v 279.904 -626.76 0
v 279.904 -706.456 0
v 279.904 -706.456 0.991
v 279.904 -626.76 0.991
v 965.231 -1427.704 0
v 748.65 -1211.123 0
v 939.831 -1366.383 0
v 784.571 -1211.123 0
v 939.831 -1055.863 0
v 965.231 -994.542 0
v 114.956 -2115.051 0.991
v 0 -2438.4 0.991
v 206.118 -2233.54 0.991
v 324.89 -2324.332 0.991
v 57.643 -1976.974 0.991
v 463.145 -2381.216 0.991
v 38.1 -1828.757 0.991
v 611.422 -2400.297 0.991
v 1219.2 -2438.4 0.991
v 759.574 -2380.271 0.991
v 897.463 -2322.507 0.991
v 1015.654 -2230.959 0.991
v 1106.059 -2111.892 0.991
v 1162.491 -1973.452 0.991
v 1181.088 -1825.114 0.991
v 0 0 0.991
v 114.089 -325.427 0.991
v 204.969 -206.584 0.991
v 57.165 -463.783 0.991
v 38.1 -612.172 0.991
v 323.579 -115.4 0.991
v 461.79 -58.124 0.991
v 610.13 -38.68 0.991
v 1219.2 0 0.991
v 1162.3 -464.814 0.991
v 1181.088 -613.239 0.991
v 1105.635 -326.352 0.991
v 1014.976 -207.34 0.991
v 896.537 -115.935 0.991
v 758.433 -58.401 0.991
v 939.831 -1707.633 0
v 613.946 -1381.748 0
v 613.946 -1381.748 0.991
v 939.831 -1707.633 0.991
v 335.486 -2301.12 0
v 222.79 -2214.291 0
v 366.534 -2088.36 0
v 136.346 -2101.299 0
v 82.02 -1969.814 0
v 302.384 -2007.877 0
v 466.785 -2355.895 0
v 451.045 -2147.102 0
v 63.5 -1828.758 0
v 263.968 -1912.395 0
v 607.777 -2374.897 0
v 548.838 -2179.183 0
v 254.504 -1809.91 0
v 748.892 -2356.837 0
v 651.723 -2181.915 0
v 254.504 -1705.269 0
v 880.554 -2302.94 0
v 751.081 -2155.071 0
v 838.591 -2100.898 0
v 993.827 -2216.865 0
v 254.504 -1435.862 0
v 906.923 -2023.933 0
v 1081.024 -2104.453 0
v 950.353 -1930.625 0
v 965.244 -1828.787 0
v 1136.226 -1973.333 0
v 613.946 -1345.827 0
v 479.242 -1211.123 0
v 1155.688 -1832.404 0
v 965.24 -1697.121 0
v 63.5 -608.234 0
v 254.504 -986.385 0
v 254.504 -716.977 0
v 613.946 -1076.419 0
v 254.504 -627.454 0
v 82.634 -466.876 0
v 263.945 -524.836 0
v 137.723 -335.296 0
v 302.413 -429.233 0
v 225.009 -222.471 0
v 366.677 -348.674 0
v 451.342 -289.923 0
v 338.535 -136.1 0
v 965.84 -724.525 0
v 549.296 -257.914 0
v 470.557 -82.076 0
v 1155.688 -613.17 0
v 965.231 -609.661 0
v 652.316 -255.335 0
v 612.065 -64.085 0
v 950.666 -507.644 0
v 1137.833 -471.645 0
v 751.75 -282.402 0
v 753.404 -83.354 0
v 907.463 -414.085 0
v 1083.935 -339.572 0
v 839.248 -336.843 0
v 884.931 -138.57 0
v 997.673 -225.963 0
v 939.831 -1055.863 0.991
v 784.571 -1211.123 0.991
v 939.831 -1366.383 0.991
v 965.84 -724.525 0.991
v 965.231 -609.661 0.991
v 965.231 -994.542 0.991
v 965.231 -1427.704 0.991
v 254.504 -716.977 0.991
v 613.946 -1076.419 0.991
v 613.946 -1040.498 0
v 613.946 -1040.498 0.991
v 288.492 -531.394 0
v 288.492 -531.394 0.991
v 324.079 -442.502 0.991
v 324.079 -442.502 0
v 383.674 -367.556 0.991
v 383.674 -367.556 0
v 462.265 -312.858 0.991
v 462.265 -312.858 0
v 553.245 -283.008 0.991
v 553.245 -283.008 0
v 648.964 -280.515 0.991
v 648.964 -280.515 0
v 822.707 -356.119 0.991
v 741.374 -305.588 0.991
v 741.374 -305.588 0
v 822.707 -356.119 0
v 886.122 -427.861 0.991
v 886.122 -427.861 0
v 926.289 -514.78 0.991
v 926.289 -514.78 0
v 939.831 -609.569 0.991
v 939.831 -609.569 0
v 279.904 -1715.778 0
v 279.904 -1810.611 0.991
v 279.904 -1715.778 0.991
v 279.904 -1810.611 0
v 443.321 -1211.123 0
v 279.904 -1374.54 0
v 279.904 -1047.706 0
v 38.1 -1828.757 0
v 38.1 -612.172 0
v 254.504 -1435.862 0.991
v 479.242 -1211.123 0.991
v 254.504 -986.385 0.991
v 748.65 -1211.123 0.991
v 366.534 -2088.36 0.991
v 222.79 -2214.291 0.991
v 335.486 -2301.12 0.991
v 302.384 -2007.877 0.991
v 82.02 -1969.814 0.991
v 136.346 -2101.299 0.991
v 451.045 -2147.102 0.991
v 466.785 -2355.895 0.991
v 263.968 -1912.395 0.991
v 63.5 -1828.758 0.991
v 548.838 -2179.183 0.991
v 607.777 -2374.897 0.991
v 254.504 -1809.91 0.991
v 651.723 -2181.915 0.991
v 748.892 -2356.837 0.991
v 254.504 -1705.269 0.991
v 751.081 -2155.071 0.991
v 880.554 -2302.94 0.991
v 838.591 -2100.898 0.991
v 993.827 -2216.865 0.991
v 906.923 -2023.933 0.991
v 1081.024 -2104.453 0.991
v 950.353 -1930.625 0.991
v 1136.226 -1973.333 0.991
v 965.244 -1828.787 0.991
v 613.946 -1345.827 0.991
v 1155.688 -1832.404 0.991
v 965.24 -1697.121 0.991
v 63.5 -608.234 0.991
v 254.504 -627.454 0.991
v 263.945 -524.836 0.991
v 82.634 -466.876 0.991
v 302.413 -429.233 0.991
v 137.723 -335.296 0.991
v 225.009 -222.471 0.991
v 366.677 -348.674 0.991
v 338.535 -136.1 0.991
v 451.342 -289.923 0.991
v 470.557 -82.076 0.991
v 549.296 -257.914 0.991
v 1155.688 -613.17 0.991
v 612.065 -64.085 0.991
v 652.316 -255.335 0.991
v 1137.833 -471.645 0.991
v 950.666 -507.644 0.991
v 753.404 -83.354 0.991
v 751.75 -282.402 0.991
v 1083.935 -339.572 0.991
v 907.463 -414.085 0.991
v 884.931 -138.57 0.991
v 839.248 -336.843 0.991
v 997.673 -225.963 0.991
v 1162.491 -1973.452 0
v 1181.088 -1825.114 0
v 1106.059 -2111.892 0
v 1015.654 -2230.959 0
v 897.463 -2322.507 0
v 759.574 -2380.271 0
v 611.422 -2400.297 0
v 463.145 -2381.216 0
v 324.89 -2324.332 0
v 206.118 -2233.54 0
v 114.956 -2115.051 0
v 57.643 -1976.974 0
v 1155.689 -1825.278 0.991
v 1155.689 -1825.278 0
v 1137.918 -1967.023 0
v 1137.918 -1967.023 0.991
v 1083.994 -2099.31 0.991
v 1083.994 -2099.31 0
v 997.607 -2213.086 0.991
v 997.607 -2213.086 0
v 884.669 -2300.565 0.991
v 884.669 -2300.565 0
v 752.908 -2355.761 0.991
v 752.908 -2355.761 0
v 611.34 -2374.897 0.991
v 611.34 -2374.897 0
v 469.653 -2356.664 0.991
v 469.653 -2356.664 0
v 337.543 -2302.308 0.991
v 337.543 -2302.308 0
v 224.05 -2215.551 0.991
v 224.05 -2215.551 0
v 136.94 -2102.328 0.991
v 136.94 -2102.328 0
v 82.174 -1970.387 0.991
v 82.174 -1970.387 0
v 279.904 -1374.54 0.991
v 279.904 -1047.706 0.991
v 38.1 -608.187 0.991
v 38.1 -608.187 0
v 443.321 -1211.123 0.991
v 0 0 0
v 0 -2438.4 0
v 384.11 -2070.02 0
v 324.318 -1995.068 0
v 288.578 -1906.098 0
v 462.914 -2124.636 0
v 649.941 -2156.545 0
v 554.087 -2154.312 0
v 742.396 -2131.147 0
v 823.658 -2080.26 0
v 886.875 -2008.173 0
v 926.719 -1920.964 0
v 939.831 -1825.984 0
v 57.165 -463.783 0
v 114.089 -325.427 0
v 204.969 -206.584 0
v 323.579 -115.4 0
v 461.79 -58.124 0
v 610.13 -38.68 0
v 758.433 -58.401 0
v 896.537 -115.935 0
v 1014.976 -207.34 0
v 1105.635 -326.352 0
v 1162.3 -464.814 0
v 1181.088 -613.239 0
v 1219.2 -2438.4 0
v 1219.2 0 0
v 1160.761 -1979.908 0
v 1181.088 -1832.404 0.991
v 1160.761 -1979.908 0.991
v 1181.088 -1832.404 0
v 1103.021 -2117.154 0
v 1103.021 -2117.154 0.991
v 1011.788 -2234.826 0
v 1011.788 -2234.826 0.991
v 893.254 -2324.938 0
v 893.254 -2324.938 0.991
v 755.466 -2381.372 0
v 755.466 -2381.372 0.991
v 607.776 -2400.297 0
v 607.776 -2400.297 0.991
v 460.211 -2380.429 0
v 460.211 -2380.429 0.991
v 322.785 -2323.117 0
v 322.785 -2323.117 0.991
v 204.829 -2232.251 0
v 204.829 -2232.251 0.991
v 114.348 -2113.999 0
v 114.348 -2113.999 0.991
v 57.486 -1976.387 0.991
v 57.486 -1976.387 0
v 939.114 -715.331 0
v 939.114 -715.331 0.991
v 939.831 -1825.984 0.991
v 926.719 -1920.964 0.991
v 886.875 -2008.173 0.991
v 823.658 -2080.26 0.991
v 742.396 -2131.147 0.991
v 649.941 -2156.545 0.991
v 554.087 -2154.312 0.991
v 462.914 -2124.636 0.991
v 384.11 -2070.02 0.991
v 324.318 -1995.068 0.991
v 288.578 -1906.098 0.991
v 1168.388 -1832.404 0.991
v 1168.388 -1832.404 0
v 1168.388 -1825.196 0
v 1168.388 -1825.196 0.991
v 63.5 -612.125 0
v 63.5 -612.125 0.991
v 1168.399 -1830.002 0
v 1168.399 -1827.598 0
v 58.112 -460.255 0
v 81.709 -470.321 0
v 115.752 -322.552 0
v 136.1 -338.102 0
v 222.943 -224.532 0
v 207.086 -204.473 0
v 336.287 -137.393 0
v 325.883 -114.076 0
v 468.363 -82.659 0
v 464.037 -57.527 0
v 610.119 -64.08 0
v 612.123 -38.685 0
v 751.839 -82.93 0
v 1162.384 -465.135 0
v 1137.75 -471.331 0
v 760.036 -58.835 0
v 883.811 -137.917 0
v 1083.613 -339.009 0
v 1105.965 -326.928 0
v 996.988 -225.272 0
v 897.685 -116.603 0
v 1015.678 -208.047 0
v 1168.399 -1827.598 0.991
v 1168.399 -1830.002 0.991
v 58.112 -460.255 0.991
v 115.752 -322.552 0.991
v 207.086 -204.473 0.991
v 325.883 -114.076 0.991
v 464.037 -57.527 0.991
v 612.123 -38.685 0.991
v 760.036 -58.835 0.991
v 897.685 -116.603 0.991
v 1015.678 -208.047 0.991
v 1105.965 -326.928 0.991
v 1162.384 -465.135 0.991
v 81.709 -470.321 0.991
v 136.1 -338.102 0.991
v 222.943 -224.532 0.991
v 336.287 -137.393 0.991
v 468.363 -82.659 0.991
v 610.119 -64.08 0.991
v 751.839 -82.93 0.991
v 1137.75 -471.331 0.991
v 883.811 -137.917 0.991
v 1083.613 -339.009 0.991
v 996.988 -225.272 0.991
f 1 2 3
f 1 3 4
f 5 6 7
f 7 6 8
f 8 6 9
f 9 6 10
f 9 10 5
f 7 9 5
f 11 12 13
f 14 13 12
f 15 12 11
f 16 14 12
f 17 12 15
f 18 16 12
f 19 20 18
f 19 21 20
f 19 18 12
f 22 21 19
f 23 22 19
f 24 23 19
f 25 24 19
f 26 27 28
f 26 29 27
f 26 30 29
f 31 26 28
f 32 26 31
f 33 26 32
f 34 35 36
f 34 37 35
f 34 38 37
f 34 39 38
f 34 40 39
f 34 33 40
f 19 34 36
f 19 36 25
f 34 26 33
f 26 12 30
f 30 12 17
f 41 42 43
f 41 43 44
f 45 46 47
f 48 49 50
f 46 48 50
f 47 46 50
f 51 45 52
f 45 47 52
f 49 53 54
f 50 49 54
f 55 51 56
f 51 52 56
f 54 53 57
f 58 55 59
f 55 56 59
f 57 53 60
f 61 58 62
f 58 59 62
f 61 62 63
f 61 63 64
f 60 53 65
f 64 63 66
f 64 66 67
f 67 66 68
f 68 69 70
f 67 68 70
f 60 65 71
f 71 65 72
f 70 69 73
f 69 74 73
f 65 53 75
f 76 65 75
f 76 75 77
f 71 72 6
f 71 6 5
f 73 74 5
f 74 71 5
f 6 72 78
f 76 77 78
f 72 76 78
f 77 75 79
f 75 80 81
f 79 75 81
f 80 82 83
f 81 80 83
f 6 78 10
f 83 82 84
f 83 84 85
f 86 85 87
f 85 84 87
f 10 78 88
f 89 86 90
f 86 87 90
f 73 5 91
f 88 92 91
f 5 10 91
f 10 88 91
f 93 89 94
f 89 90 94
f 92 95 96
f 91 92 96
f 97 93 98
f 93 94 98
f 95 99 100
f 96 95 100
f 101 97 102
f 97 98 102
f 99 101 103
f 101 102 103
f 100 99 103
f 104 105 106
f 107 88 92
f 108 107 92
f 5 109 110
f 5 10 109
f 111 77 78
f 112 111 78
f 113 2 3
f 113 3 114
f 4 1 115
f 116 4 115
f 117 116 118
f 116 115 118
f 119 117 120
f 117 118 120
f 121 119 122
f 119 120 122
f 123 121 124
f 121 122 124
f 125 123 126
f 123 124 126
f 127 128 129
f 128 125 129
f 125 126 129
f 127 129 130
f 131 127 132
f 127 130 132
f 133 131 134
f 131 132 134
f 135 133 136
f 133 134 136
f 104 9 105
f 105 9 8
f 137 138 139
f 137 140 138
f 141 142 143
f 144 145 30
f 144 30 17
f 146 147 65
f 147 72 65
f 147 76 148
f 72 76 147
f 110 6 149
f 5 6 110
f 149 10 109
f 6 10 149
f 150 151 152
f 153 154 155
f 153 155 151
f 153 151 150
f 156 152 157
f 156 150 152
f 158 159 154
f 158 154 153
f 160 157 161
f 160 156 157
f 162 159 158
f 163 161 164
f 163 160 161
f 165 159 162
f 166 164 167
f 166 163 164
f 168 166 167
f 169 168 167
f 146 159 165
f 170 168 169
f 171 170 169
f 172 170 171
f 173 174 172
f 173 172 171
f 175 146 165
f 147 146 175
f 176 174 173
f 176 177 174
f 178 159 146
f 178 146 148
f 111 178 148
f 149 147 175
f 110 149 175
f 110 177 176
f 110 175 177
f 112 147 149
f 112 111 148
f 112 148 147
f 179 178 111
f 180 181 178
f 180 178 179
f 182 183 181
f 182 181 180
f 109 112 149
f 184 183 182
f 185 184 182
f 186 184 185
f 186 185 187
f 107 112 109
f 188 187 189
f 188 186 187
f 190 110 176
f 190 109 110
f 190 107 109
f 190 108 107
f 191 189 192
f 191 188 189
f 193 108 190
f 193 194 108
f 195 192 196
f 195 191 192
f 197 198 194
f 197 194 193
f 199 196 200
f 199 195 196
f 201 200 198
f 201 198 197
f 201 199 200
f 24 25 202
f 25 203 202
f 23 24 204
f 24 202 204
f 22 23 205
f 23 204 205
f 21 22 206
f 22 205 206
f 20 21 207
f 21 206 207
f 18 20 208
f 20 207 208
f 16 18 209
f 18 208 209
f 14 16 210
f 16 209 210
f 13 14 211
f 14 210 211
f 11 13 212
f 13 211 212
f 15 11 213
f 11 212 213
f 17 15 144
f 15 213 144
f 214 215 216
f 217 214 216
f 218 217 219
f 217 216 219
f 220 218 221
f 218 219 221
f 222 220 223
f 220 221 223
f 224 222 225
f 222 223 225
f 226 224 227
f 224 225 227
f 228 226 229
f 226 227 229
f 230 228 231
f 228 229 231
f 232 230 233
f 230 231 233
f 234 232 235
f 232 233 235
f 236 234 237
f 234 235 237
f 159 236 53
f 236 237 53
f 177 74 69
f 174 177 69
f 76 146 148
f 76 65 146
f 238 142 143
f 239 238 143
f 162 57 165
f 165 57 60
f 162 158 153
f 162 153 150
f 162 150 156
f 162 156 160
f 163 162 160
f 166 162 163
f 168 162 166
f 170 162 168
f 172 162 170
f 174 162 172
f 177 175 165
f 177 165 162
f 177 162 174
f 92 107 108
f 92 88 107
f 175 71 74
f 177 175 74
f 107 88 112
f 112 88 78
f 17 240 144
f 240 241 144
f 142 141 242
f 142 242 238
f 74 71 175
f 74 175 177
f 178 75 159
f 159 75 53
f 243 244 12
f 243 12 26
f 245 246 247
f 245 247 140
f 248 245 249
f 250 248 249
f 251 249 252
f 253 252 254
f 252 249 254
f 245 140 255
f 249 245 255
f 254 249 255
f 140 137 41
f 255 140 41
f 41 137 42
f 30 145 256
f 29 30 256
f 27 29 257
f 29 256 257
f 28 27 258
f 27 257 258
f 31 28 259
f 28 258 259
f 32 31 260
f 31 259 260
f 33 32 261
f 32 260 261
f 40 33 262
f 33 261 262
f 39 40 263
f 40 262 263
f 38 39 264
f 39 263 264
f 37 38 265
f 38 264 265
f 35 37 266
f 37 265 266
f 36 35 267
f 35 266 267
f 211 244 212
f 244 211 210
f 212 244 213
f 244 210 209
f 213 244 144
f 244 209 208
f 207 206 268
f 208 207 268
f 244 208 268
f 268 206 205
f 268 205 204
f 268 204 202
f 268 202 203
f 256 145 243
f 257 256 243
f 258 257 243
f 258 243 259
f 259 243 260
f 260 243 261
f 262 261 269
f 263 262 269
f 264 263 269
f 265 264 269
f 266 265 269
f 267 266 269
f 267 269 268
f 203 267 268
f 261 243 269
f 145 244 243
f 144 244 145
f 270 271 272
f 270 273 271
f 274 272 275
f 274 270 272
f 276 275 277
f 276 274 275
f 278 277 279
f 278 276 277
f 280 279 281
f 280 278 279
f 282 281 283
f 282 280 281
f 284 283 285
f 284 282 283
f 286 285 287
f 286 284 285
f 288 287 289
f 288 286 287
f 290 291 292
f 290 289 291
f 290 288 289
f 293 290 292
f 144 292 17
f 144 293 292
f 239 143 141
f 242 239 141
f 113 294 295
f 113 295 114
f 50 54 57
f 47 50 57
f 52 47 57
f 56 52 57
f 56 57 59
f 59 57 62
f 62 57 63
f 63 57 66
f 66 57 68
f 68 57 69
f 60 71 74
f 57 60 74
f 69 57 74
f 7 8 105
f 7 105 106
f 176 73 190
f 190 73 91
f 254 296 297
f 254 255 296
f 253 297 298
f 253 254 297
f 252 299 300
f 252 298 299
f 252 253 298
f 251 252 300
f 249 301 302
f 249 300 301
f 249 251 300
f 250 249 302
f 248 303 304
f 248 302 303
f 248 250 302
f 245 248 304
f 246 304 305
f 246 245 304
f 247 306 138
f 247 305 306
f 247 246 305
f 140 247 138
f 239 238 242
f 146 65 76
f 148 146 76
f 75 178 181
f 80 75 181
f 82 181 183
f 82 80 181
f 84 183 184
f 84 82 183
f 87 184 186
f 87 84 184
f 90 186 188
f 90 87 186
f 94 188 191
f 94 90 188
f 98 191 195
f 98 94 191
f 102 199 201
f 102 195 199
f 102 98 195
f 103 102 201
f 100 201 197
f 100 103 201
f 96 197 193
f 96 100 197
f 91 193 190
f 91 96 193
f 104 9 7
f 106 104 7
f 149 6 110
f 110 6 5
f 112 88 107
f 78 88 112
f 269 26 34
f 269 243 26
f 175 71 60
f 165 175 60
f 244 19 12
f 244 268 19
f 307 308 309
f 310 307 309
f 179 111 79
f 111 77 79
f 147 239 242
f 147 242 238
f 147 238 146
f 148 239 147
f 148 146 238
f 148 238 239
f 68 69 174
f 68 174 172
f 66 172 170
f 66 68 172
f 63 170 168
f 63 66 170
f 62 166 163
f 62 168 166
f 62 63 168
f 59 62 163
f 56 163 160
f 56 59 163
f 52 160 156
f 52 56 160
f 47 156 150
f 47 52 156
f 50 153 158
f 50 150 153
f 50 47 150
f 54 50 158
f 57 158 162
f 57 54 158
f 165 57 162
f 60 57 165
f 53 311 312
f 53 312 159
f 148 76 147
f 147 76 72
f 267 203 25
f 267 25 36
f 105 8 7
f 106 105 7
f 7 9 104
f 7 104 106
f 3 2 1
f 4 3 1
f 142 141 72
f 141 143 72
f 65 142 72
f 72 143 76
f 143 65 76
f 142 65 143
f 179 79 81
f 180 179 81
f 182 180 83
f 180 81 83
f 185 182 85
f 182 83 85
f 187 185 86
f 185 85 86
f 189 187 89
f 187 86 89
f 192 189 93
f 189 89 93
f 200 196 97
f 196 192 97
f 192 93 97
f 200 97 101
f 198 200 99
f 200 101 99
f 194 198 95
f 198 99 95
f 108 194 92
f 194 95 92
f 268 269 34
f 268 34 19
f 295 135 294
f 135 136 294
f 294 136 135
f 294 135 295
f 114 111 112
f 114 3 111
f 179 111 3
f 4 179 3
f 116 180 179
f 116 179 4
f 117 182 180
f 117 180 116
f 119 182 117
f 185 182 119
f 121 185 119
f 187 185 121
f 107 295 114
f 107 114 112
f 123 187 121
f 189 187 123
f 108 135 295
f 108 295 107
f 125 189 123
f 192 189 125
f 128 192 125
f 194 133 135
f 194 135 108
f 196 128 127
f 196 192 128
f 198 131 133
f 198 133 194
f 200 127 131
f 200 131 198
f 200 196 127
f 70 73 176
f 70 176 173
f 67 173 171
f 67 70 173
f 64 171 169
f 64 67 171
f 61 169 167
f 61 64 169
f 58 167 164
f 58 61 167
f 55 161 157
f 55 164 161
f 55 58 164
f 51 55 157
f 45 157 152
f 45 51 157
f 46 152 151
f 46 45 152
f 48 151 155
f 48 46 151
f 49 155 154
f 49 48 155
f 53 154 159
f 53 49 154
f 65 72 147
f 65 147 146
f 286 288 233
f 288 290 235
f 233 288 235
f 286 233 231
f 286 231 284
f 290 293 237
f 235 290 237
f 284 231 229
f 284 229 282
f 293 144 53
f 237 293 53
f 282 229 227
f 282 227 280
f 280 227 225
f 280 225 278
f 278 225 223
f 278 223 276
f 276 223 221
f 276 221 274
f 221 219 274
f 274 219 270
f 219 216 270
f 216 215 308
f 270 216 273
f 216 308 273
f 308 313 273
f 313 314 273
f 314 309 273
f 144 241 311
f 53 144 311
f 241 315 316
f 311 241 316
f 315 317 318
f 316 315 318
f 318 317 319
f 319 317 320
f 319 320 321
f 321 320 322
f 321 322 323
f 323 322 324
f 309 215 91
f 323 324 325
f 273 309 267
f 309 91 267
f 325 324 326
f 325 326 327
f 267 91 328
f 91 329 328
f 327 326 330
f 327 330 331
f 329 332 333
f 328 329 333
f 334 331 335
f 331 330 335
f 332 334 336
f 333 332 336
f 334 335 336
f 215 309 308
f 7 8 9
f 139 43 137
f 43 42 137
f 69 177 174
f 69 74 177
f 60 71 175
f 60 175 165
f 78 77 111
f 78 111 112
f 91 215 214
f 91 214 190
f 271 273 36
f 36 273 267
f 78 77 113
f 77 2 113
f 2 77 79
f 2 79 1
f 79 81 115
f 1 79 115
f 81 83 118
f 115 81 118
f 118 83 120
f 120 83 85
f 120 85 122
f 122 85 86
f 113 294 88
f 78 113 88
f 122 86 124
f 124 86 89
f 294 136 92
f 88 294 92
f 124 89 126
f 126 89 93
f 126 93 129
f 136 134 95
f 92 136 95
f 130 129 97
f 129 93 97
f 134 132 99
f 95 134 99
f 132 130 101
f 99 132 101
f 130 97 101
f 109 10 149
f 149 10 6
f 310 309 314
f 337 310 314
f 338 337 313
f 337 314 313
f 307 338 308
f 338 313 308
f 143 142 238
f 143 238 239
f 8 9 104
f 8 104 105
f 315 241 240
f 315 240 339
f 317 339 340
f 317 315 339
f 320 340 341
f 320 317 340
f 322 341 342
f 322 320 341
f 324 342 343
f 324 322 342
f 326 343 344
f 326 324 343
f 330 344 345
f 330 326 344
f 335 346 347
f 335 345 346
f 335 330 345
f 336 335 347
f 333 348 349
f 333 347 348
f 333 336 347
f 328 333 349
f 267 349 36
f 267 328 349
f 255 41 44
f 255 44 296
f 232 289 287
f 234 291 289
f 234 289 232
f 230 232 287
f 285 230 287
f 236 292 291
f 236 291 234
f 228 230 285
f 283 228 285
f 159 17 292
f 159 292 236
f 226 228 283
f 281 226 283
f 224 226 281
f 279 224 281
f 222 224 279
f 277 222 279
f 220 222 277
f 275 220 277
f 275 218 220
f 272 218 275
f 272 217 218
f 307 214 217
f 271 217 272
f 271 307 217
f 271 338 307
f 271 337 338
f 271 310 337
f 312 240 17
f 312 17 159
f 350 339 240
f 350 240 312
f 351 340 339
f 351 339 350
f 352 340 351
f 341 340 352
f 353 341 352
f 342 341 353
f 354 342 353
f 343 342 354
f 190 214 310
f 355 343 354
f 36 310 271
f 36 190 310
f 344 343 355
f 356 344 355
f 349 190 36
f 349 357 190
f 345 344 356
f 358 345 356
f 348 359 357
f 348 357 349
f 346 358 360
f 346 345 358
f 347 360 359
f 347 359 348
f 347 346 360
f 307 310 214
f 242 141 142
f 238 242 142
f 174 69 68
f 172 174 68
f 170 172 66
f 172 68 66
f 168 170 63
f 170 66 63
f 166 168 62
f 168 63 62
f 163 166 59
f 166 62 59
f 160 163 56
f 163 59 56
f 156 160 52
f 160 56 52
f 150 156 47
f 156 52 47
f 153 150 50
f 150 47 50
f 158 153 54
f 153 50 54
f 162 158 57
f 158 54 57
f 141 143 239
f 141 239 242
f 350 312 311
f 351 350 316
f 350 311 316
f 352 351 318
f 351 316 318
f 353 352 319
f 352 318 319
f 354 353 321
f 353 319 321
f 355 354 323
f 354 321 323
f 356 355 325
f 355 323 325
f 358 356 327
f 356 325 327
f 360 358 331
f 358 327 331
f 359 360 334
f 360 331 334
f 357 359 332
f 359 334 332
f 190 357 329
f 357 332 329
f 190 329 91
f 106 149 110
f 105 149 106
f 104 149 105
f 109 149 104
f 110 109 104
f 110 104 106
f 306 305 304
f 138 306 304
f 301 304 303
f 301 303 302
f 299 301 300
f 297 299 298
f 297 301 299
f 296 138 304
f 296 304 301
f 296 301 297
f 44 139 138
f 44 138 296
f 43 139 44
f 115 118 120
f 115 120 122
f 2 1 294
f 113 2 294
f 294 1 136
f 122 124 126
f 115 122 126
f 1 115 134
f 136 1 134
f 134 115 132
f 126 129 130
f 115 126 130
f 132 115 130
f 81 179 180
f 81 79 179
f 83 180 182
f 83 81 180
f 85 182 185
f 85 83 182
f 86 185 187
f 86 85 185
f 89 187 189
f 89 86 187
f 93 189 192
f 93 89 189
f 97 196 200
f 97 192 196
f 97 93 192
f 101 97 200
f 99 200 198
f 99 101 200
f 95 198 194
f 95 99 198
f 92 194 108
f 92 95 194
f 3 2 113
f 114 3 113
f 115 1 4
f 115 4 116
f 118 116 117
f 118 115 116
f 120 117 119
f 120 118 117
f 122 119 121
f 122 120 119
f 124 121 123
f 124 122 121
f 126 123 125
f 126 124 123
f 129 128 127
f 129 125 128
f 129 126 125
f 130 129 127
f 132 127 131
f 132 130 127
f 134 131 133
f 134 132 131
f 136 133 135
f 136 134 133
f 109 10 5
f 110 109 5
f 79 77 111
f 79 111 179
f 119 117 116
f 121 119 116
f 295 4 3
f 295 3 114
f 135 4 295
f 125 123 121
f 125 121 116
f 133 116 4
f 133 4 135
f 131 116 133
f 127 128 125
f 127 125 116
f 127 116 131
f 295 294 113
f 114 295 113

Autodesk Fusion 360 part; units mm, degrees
sketch "Sketch3" plane through (0, 0, 0) normal (0, 0, 1) x (1, 0, 0)
  line L0 (0, 0) -> (1219.2, 0)
  line L1 (1219.2, 0) -> (1219.2, -2438.4)
  line L2 (1219.2, -2438.4) -> (0, -2438.4)
  line L3 (0, -2438.4) -> (0, 0)
  line L4 (50.8, -612.14) -> (50.8, -1828.7574)
  line L5 (1168.3884, -1832.4045) -> (1168.3884, -613.2045)
  line L6 (266.7088, -711.2214) -> (1236.5646, -711.2214) construction
  arc A0 (1168.3884, -613.2045) -> (50.8, -612.14) centre (609.5966, -610.1795) ccw
  line L7 (956.7703, -715.6347) -> (952.5308, -719.8742)
  arc A1 (952.5308, -609.6133) -> (267.204, -627.1104) centre (609.6126, -608.3819) ccw
  arc A2 (50.8, -1828.7574) -> (1168.3884, -1825.1955) centre (609.6, -1828.8) ccw
  arc A3 (267.204, -1810.2641) -> (952.5308, -1825.9311) centre (609.6229, -1828.7954) ccw
  line L8 (267.204, -1017.0454) -> (461.2819, -1211.1232)
  line L9 (613.9462, -1363.7875) -> (952.5308, -1702.3721)
  line L10 (932.9449, -739.4601) -> (613.9462, -1058.4588)
  line L11 (461.2819, -1211.1232) -> (267.204, -1405.201)
  line L12 (266.7088, -711.2214) -> (613.9462, -1058.4588)
  line L13 (766.6106, -1211.1232) -> (952.5308, -1397.0434)
  line L14 (952.5308, -1025.2029) -> (766.6106, -1211.1232)
  line L15 (613.9462, -1363.7875) -> (270.9285, -1706.8053)
  line L16 (267.204, -711.7167) -> (267.204, -627.1104)
  line L17 (952.5308, -609.6133) -> (952.5308, -719.8742)
  line L18 (952.5308, -1025.2029) -> (952.5308, -1397.0434)
  line L19 (952.5308, -1702.3721) -> (952.5308, -1825.9311)
  line L20 (267.204, -1810.2641) -> (267.204, -1710.5297)
  line L21 (267.204, -1405.201) -> (267.204, -1017.0454)
  line L22 (1181.0884, -1832.4045) -> (1181.0884, -613.2386)
  arc A4 (1181.0884, -613.2386) -> (38.1055, -613.3823) centre (609.5966, -610.1795) ccw
  line L23 (1155.6884, -1832.4045) -> (1155.6884, -613.1699)
  arc A5 (1155.6884, -613.1699) -> (63.5051, -613.2381) centre (609.5966, -610.1795) ccw
  line L24 (38.1, -606.1098) -> (38.1, -1828.757)
  arc A6 (38.1, -1828.757) -> (1181.0881, -1825.1136) centre (609.6, -1828.8) ccw
  line L25 (63.5, -606.1098) -> (63.5, -1828.7579)
  arc A7 (63.5, -1828.7579) -> (1155.6886, -1825.2775) centre (609.6, -1828.8) ccw
  line L26 (254.504, -716.9772) -> (613.9462, -1076.4193)
  line L27 (965.9401, -724.4255) -> (613.9462, -1076.4193)
  line L28 (279.904, -706.4561) -> (613.9462, -1040.4983)
  line L29 (939.1137, -715.3308) -> (613.9462, -1040.4983)
  arc A8 (965.2307, -609.6611) -> (254.504, -627.4543) centre (609.6126, -608.3819) ccw
  arc A9 (939.8309, -609.5692) -> (279.904, -626.76) centre (609.6126, -608.3819) ccw
  line L30 (965.8404, -724.5252) -> (965.8963, -724.4693)
  line L31 (279.904, -706.4561) -> (279.904, -626.76)
  line L32 (254.504, -716.9772) -> (254.504, -627.4543)
  line L33 (443.3213, -1211.1232) -> (279.904, -1374.5405)
  line L34 (279.904, -1374.5405) -> (279.904, -1047.7059)
  line L35 (279.904, -1047.7059) -> (443.3213, -1211.1232)
  line L36 (479.2424, -1211.1232) -> (254.504, -1435.8615)
  line L37 (254.504, -1435.8615) -> (254.504, -986.3848)
  line L38 (254.504, -986.3848) -> (479.2424, -1211.1232)
  line L39 (965.2308, -994.5424) -> (965.2308, -1427.7039)
  line L40 (748.6501, -1211.1232) -> (965.2308, -1427.7039)
  line L41 (965.2308, -994.5424) -> (748.6501, -1211.1232)
  line L42 (939.8308, -1055.8634) -> (939.8308, -1366.3829)
  line L43 (784.5711, -1211.1232) -> (939.8308, -1366.3829)
  line L44 (939.8308, -1055.8634) -> (784.5711, -1211.1232)
  line L45 (254.504, -1809.9101) -> (254.504, -1705.2692)
  arc A10 (254.504, -1809.9101) -> (965.2435, -1828.7867) centre (609.6229, -1828.7954) ccw
  line L46 (613.9462, -1345.827) -> (965.2403, -1697.1211)
  line L47 (613.9462, -1345.827) -> (254.504, -1705.2692)
  line L48 (939.8309, -609.5692) -> (939.1137, -715.3308)
  line L49 (965.8404, -724.5252) -> (965.2307, -609.6611)
  line L50 (965.2403, -1697.1211) -> (965.2435, -1828.7867)
  line L51 (279.904, -1810.6108) -> (279.904, -1715.7784)
  arc A11 (279.904, -1810.6108) -> (939.8308, -1825.9844) centre (609.6229, -1828.7954) ccw
  line L52 (939.8308, -1707.6326) -> (939.8308, -1825.9844)
  line L53 (613.9462, -1381.748) -> (939.8308, -1707.6326)
  line L54 (613.9462, -1381.748) -> (279.9087, -1715.7855)
  line L55 (254.504, -1435.8615) -> (254.504, -1705.2692) construction
  line L56 (479.2424, -1211.1232) -> (613.9462, -1076.4193) construction
  line L57 (748.6501, -1211.1232) -> (613.9391, -1076.4122) construction
  line L58 (748.6501, -1211.1232) -> (613.9462, -1345.827) construction
  line L59 (965.2308, -1427.7039) -> (965.2403, -1697.1211) construction
  line L60 (965.2308, -994.5424) -> (965.9401, -724.4255) construction
  line L61 (254.504, -716.9772) -> (254.504, -986.3848) construction
  point P0 (609.6, -1219.2)
  point P1 (952.4942, -1727.2)
  point P2 (266.7088, -711.2214)
  point P3 (266.7223, -1727.2)
  point P4 (956.7703, -715.6347)
  point P5 (952.4944, -1524)
  point P6 (266.7222, -1524)
  point P7 (266.7223, -914.4)
  dimension "d4" = 1219.2
  dimension "d5" = 2438.4
  dimension "d7" = 1117.6
sketch "Sketch4" plane through (0, 0, 0) normal (0, 0, 1) x (1, 0, 0)
extrude "Extrude2" add sketch "Sketch3" along normal blind 0.9906 contours L4 L5 A0 A2 | L8 L11 L21 | L13 L14 L18 | L22 A4 L24 A6 | L26 L27 A8 L32 L49 | L36 L37 L38 | L39 L40 L41 | L45 A10 L46 L47 L50 makes body 1 at (494.1322, -944.6316, 0) makes body 2 at (262.9707, -1156.6507, 0) makes body 3 at (956.7641, -1159.3699, 0) makes body 4 at (46.5667, -1016.3571, 0.9906) makes body 5 at (611.2302, -1582.7391, 0)
extrude "Extrude3" add sketch "Sketch3" along normal blind 0.9906 separate body contours L0 L1 L2 L3 | L23 A5 L25 A7 makes body 6 at (1072.5358, -2309.2802, 0) makes body 7 at (127.168, -1290.9536, 0)
extrude "Extrude4" add sketch "Sketch3" along normal blind 0.9906 separate body contours L28 L29 A9 L31 L48 makes body 8
extrude "Extrude5" add sketch "Sketch3" along normal blind 0.9906 separate body contours L51 A11 L52 L53 L54 makes body 9
extrude "Extrude6" add sketch "Sketch3" along normal blind 0.9906 separate body contours L42 L43 L44 makes body 10
extrude "Extrude7" add sketch "Sketch3" along normal blind 0.9906 separate body contours L33 L34 L35 makes body 11
extrude "Extrude1" [suppressed]
